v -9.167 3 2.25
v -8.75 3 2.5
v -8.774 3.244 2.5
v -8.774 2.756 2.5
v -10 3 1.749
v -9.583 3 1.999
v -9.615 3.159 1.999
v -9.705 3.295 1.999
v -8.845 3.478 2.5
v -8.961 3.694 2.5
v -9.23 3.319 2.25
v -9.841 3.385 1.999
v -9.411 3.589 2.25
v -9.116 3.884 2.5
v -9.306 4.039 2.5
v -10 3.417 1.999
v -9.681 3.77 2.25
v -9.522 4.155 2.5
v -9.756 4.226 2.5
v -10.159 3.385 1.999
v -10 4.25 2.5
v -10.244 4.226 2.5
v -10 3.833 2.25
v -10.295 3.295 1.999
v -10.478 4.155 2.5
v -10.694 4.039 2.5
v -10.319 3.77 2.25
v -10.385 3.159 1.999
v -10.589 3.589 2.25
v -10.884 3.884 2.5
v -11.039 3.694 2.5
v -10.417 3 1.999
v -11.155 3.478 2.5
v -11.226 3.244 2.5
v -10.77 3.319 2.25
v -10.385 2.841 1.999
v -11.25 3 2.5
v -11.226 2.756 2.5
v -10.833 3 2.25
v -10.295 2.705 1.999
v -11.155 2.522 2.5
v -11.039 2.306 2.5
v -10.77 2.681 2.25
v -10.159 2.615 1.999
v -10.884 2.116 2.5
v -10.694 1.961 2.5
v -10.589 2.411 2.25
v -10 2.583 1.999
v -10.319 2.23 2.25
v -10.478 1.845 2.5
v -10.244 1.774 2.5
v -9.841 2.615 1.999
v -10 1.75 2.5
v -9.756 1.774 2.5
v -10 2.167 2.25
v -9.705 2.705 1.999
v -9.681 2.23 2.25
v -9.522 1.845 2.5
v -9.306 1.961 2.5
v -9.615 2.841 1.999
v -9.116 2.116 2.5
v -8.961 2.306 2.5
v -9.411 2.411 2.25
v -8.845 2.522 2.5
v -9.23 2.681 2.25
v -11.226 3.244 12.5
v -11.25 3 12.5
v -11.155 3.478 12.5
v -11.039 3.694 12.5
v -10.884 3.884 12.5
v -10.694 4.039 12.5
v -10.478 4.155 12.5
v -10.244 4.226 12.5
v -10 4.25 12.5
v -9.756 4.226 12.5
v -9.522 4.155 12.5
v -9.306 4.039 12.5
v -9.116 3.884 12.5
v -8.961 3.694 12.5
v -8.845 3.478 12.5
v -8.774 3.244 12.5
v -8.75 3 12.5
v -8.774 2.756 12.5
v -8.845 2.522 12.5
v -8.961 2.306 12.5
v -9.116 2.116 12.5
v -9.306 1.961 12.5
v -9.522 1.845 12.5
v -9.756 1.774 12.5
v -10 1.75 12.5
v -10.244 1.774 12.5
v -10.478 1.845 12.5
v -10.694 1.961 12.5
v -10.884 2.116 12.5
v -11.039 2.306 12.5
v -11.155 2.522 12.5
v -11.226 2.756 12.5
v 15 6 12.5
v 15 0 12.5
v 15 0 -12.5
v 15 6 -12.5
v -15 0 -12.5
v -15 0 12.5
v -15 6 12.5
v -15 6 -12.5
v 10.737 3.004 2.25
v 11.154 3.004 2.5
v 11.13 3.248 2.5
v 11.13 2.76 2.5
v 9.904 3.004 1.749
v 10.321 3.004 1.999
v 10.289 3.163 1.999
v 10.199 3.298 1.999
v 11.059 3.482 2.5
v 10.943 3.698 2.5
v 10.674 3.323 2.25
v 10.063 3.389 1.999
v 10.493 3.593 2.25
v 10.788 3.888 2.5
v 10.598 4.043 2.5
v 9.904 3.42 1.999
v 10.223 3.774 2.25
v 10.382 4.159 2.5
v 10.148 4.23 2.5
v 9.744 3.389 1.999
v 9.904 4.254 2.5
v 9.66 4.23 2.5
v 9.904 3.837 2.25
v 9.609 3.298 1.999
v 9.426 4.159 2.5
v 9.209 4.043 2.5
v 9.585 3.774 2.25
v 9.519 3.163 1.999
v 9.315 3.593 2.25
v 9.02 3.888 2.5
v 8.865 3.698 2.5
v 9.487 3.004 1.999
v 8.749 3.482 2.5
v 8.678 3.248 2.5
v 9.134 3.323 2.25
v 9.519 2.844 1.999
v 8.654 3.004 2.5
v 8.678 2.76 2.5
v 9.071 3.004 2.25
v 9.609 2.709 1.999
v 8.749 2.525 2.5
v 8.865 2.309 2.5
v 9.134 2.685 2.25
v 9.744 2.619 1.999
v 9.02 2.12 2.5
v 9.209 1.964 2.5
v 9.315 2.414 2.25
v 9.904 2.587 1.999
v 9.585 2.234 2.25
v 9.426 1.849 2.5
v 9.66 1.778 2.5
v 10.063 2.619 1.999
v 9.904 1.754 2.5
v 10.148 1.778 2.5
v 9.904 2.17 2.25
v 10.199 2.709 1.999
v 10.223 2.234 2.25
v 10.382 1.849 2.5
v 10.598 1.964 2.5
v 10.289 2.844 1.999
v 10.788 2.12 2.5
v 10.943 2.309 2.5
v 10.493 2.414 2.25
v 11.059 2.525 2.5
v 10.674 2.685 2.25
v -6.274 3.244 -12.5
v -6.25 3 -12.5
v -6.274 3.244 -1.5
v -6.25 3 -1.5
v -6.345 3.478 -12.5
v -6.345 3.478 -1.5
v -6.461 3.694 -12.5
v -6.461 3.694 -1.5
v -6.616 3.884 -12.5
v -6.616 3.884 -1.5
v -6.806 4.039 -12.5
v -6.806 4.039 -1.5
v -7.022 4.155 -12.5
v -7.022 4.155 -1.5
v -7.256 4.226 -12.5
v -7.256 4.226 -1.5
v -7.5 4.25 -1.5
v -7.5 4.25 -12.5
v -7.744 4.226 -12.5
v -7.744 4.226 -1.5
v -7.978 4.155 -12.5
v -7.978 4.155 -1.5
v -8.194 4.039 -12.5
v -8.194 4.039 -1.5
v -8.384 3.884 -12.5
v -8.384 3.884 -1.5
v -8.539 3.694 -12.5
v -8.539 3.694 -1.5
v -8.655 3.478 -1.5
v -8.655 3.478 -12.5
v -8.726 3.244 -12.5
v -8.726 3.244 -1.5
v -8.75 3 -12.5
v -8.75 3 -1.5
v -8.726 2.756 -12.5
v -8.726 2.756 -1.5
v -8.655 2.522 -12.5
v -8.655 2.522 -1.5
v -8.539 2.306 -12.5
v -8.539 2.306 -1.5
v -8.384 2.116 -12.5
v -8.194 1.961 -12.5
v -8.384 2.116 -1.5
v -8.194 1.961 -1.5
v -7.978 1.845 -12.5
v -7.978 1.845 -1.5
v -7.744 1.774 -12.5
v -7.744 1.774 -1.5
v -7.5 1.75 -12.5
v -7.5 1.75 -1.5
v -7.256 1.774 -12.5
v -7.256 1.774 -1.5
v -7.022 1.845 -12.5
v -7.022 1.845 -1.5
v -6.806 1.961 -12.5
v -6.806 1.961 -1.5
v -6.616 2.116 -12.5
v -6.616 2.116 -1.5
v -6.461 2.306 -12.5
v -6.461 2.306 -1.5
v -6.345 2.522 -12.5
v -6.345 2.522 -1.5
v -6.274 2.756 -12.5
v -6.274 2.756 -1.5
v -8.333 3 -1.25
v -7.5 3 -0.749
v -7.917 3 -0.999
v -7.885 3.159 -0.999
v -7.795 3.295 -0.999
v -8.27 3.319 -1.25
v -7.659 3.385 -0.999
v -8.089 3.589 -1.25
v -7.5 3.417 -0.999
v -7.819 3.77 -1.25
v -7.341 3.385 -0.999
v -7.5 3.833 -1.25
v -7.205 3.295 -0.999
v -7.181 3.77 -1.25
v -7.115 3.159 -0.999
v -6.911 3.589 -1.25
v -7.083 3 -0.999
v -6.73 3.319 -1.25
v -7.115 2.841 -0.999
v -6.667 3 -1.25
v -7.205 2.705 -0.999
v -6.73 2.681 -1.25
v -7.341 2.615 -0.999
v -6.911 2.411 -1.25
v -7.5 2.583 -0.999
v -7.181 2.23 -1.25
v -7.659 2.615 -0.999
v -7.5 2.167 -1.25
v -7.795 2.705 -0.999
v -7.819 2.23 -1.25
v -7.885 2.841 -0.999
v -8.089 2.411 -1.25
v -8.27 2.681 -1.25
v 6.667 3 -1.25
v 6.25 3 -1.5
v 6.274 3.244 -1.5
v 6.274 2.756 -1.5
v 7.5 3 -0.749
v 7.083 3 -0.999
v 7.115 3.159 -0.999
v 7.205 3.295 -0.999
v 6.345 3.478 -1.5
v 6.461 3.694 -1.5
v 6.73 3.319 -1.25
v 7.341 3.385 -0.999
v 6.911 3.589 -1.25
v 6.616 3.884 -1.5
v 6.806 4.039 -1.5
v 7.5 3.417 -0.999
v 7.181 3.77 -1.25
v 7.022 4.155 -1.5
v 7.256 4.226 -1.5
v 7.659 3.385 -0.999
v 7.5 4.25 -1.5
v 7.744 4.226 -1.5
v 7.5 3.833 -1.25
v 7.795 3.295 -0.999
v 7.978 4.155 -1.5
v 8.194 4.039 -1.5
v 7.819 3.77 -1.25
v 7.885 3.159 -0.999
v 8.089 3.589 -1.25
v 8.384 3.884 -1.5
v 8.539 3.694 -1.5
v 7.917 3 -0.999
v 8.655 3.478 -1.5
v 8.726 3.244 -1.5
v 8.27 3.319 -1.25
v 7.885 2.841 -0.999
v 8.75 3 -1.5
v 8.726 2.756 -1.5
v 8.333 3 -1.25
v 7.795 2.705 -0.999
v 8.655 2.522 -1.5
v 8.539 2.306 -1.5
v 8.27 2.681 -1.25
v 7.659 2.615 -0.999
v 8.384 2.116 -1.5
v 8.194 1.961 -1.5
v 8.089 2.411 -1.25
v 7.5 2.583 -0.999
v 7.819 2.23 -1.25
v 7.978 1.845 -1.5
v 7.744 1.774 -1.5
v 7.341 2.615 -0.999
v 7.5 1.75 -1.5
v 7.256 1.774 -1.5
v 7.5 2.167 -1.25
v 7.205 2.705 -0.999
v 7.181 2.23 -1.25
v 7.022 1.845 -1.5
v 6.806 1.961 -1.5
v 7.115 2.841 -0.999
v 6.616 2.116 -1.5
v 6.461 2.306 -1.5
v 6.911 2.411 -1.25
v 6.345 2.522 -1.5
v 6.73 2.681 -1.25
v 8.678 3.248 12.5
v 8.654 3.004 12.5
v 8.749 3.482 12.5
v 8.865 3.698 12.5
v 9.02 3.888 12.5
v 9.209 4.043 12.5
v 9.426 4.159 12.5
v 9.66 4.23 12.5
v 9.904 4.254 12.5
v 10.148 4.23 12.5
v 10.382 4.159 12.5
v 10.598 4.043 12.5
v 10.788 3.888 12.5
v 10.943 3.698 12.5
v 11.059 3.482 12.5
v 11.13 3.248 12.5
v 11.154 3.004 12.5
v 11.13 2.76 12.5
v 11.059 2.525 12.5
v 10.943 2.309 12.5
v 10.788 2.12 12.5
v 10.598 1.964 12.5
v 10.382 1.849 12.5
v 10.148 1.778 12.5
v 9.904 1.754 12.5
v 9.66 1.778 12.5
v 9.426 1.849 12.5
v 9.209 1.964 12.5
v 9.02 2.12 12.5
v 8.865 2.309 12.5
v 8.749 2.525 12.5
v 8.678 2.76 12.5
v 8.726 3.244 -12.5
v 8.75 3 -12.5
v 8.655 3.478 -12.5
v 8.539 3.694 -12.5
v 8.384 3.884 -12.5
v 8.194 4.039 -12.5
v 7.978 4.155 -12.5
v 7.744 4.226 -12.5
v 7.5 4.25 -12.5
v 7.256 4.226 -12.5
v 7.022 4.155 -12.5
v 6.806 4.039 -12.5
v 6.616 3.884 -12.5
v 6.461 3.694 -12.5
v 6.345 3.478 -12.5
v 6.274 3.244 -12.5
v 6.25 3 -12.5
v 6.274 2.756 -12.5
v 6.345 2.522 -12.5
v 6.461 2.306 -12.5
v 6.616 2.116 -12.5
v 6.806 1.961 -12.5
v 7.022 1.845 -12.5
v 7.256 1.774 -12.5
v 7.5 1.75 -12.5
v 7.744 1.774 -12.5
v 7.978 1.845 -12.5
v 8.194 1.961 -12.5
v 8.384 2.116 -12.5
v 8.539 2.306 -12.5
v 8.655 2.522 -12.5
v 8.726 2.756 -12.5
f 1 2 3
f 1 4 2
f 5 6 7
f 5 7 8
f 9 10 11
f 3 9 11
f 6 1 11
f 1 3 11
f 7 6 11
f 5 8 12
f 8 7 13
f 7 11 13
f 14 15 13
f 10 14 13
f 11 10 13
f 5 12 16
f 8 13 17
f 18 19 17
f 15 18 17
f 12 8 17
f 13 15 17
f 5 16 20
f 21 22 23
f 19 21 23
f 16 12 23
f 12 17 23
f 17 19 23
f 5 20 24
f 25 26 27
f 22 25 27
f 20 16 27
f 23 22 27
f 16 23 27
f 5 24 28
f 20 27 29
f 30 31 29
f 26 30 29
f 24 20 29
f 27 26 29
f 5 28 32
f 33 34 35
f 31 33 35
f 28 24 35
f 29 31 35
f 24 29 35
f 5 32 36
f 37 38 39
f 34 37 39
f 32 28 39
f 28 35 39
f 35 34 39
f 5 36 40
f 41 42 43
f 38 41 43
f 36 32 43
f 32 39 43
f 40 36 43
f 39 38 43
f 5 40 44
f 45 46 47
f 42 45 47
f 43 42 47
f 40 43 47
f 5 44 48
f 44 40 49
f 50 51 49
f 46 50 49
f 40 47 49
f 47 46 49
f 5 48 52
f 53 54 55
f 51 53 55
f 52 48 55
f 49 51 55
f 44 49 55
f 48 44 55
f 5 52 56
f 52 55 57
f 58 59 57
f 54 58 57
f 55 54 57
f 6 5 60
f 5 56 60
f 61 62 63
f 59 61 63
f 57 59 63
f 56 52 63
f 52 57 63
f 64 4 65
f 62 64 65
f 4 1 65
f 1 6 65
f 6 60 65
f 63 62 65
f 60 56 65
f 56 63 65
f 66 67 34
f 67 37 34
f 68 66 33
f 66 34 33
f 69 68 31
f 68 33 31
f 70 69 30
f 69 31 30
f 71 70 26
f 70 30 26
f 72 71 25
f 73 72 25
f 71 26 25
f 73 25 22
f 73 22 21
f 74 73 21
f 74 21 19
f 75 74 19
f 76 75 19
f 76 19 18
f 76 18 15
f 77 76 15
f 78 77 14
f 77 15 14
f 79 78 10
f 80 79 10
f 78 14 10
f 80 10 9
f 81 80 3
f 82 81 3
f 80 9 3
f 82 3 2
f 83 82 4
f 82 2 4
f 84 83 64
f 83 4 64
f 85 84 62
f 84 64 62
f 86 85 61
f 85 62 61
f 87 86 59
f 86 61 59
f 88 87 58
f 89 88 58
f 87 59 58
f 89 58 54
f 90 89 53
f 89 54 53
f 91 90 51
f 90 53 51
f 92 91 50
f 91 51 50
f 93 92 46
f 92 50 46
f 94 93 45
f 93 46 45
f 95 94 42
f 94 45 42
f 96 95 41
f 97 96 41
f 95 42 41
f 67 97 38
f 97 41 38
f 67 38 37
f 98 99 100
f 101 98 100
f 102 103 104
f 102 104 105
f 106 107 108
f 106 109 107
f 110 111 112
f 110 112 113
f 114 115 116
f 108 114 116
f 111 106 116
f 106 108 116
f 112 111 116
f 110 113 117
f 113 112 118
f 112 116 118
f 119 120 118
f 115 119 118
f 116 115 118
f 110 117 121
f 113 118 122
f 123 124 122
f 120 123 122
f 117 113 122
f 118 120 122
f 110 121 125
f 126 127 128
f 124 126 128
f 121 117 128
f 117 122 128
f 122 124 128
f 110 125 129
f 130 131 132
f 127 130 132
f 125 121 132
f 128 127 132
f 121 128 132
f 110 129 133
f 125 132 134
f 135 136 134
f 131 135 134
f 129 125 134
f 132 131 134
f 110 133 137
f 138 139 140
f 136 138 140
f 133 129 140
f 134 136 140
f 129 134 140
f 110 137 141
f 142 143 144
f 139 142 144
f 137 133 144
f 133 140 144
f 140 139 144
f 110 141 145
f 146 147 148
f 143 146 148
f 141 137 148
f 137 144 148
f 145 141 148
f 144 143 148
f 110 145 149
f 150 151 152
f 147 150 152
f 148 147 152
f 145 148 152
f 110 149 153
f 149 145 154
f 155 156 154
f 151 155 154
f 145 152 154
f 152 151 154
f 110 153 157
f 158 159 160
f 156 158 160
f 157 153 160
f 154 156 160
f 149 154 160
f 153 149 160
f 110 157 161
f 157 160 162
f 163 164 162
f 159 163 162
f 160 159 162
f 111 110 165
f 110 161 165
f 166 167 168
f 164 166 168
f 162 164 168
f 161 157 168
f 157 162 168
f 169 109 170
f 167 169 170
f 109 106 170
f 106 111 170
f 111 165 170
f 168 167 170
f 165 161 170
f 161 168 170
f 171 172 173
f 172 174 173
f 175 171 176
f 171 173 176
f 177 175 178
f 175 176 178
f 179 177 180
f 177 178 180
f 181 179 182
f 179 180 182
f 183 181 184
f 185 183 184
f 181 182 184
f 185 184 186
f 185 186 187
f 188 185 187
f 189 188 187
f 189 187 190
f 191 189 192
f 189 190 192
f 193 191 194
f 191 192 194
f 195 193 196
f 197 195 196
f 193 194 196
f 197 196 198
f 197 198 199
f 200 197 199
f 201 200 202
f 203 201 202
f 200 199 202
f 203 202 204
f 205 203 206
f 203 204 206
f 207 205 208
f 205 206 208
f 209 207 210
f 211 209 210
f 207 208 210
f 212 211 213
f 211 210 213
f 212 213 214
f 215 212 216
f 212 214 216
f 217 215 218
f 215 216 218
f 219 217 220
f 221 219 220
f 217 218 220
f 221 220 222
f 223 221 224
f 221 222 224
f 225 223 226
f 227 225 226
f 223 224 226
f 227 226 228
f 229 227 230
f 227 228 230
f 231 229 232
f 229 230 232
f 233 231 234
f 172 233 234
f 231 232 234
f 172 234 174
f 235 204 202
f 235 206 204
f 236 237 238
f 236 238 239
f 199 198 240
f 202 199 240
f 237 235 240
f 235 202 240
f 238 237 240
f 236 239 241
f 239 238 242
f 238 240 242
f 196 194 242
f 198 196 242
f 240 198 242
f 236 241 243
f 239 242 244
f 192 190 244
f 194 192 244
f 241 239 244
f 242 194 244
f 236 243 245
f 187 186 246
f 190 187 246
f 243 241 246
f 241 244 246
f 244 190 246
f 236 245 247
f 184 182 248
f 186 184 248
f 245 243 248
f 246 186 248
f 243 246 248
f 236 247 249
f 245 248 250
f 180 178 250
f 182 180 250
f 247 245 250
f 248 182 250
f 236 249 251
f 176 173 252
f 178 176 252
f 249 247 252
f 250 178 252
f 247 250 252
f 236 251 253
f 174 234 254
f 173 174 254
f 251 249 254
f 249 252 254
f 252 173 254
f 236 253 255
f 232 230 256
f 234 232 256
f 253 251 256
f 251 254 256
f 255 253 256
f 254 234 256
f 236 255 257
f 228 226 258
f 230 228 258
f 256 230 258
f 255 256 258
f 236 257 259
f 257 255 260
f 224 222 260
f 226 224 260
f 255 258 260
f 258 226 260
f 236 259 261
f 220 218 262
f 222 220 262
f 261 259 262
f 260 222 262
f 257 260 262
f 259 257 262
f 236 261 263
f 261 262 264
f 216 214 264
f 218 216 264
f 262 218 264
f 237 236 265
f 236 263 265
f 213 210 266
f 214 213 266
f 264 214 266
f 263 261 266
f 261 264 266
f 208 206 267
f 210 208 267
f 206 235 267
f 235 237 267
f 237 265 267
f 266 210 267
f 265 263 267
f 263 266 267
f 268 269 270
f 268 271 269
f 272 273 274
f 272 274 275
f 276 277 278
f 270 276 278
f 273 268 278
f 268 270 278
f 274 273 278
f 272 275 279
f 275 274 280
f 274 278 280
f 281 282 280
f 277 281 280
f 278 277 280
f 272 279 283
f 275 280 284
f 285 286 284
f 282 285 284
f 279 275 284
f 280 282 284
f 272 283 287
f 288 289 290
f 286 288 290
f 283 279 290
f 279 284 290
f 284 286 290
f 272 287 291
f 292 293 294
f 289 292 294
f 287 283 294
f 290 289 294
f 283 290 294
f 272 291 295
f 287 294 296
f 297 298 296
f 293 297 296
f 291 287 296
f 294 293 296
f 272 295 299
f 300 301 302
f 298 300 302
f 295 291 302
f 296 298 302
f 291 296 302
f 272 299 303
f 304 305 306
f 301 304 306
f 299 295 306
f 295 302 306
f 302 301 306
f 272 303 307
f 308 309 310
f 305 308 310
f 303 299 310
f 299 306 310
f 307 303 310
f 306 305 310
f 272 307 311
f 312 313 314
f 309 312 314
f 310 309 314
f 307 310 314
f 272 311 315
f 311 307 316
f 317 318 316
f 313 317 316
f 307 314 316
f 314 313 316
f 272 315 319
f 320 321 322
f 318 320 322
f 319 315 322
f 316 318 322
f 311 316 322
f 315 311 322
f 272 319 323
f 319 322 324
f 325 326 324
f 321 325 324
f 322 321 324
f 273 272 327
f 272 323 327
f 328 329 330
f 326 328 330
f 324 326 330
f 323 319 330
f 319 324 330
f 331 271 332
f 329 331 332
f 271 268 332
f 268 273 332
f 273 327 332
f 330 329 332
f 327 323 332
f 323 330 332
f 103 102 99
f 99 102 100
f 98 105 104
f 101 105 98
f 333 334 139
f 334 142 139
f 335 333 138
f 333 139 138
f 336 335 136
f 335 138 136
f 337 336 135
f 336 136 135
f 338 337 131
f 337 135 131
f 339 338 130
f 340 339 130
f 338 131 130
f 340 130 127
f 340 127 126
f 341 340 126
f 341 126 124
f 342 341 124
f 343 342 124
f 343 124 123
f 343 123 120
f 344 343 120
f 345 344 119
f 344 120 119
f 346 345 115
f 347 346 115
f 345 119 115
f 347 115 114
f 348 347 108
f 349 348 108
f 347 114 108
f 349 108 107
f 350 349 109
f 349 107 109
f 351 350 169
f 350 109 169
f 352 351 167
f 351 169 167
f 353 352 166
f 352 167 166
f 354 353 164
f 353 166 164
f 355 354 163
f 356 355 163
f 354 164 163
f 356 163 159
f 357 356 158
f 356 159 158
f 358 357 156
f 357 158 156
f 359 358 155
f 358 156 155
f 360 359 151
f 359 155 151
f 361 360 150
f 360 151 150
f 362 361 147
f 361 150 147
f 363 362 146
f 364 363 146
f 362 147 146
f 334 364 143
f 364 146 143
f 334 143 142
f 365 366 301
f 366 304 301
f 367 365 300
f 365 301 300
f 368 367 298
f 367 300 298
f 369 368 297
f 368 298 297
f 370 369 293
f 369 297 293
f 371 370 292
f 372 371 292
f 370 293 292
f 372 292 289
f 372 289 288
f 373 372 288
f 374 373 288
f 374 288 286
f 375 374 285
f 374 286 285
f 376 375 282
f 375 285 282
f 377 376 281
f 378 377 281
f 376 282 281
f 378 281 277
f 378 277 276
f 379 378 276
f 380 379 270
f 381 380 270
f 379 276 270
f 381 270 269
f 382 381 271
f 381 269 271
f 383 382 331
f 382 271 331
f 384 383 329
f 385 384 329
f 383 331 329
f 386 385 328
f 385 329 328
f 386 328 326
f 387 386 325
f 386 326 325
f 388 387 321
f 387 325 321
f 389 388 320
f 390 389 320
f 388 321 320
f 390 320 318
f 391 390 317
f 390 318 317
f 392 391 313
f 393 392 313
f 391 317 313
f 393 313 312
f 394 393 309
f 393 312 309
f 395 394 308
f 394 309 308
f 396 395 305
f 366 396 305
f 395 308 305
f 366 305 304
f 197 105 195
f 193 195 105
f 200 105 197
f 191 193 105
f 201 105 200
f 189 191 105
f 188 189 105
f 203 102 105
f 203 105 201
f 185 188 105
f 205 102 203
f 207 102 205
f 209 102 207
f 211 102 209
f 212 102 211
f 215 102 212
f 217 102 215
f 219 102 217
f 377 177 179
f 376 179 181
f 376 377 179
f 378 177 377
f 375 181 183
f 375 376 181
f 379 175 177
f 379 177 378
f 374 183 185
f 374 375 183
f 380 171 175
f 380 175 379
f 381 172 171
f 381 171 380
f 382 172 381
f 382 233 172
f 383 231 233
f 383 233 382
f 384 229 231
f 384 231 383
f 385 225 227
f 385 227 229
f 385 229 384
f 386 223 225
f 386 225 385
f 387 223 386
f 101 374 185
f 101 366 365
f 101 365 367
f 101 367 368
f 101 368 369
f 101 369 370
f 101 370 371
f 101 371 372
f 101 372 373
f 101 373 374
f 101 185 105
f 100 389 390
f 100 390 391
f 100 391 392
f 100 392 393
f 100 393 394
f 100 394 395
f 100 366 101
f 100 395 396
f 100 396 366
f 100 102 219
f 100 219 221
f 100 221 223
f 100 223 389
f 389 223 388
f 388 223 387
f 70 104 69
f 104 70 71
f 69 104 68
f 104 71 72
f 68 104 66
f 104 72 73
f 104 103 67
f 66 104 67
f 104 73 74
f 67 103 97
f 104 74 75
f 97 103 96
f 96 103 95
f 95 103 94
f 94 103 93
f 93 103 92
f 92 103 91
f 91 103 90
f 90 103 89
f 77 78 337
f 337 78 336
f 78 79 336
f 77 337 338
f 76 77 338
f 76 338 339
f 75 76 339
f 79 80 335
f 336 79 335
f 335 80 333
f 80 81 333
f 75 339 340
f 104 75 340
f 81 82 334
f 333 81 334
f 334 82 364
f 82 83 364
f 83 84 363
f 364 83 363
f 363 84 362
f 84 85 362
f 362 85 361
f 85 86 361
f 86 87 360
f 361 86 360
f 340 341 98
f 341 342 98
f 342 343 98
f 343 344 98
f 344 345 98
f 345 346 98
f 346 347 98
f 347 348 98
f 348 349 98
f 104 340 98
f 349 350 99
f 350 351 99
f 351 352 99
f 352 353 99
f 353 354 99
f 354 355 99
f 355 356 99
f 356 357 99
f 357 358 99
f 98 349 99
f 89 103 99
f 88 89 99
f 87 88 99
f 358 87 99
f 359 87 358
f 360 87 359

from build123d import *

# Parameters (mm, degrees)
ESQUISSE1_W                                   = 30
ESQUISSE1_H                                   = 25
BOSS_EXTRU_1_DEPTH                            = 6
TROU_POUR_TARAUDAGE_POUR_TROU_TARAUD_M3_D     = 2.5
TROU_POUR_TARAUDAGE_POUR_TROU_TARAUD_M3_DEPTH = 10
TROU_POUR_TARAUDAGE_POUR_TROU_TARAUD_M3_TIP   = 0.751075774
TROU_POUR_TARAUDAGE_POUR_TROU_TARAUD_2_D      = 2.5
TROU_POUR_TARAUDAGE_POUR_TROU_TARAUD_2_DEPTH  = 11
TROU_POUR_TARAUDAGE_POUR_TROU_TARAUD_2_TIP    = 0.751075774


with BuildPart() as part:
    # Esquisse1 → Boss.-Extru.1 (new body)
    with BuildSketch(Plane(origin=(0, 0, 0), x_dir=(1, 0, 0), z_dir=(0, 1, 0))):
        Rectangle(ESQUISSE1_W, ESQUISSE1_H)
    extrude(amount=BOSS_EXTRU_1_DEPTH)

    # Trou pour taraudage pour trou taraud_ M3
    with Locations(Plane.XY.offset(12.5)):
        with Locations((-10, 3), (9.903892631, 3.003728502)):
            Hole(TROU_POUR_TARAUDAGE_POUR_TROU_TARAUD_M3_D / 2, depth=TROU_POUR_TARAUDAGE_POUR_TROU_TARAUD_M3_DEPTH)
            with Locations((0, 0, -(TROU_POUR_TARAUDAGE_POUR_TROU_TARAUD_M3_DEPTH + TROU_POUR_TARAUDAGE_POUR_TROU_TARAUD_M3_TIP / 2))):  # 118° drill point
                Cone(0, TROU_POUR_TARAUDAGE_POUR_TROU_TARAUD_M3_D / 2, TROU_POUR_TARAUDAGE_POUR_TROU_TARAUD_M3_TIP, mode=Mode.SUBTRACT)

    # Trou pour taraudage pour trou taraud 2
    with Locations(Plane(origin=(0, 0, -12.5), x_dir=(-1, 0, 0), z_dir=(0, 0, -1))):
        with Locations((-7.5, 3), (7.5, 3)):
            Hole(TROU_POUR_TARAUDAGE_POUR_TROU_TARAUD_2_D / 2, depth=TROU_POUR_TARAUDAGE_POUR_TROU_TARAUD_2_DEPTH)
            with Locations((0, 0, -(TROU_POUR_TARAUDAGE_POUR_TROU_TARAUD_2_DEPTH + TROU_POUR_TARAUDAGE_POUR_TROU_TARAUD_2_TIP / 2))):  # 118° drill point
                Cone(0, TROU_POUR_TARAUDAGE_POUR_TROU_TARAUD_2_D / 2, TROU_POUR_TARAUDAGE_POUR_TROU_TARAUD_2_TIP, mode=Mode.SUBTRACT)


solid = part.part
